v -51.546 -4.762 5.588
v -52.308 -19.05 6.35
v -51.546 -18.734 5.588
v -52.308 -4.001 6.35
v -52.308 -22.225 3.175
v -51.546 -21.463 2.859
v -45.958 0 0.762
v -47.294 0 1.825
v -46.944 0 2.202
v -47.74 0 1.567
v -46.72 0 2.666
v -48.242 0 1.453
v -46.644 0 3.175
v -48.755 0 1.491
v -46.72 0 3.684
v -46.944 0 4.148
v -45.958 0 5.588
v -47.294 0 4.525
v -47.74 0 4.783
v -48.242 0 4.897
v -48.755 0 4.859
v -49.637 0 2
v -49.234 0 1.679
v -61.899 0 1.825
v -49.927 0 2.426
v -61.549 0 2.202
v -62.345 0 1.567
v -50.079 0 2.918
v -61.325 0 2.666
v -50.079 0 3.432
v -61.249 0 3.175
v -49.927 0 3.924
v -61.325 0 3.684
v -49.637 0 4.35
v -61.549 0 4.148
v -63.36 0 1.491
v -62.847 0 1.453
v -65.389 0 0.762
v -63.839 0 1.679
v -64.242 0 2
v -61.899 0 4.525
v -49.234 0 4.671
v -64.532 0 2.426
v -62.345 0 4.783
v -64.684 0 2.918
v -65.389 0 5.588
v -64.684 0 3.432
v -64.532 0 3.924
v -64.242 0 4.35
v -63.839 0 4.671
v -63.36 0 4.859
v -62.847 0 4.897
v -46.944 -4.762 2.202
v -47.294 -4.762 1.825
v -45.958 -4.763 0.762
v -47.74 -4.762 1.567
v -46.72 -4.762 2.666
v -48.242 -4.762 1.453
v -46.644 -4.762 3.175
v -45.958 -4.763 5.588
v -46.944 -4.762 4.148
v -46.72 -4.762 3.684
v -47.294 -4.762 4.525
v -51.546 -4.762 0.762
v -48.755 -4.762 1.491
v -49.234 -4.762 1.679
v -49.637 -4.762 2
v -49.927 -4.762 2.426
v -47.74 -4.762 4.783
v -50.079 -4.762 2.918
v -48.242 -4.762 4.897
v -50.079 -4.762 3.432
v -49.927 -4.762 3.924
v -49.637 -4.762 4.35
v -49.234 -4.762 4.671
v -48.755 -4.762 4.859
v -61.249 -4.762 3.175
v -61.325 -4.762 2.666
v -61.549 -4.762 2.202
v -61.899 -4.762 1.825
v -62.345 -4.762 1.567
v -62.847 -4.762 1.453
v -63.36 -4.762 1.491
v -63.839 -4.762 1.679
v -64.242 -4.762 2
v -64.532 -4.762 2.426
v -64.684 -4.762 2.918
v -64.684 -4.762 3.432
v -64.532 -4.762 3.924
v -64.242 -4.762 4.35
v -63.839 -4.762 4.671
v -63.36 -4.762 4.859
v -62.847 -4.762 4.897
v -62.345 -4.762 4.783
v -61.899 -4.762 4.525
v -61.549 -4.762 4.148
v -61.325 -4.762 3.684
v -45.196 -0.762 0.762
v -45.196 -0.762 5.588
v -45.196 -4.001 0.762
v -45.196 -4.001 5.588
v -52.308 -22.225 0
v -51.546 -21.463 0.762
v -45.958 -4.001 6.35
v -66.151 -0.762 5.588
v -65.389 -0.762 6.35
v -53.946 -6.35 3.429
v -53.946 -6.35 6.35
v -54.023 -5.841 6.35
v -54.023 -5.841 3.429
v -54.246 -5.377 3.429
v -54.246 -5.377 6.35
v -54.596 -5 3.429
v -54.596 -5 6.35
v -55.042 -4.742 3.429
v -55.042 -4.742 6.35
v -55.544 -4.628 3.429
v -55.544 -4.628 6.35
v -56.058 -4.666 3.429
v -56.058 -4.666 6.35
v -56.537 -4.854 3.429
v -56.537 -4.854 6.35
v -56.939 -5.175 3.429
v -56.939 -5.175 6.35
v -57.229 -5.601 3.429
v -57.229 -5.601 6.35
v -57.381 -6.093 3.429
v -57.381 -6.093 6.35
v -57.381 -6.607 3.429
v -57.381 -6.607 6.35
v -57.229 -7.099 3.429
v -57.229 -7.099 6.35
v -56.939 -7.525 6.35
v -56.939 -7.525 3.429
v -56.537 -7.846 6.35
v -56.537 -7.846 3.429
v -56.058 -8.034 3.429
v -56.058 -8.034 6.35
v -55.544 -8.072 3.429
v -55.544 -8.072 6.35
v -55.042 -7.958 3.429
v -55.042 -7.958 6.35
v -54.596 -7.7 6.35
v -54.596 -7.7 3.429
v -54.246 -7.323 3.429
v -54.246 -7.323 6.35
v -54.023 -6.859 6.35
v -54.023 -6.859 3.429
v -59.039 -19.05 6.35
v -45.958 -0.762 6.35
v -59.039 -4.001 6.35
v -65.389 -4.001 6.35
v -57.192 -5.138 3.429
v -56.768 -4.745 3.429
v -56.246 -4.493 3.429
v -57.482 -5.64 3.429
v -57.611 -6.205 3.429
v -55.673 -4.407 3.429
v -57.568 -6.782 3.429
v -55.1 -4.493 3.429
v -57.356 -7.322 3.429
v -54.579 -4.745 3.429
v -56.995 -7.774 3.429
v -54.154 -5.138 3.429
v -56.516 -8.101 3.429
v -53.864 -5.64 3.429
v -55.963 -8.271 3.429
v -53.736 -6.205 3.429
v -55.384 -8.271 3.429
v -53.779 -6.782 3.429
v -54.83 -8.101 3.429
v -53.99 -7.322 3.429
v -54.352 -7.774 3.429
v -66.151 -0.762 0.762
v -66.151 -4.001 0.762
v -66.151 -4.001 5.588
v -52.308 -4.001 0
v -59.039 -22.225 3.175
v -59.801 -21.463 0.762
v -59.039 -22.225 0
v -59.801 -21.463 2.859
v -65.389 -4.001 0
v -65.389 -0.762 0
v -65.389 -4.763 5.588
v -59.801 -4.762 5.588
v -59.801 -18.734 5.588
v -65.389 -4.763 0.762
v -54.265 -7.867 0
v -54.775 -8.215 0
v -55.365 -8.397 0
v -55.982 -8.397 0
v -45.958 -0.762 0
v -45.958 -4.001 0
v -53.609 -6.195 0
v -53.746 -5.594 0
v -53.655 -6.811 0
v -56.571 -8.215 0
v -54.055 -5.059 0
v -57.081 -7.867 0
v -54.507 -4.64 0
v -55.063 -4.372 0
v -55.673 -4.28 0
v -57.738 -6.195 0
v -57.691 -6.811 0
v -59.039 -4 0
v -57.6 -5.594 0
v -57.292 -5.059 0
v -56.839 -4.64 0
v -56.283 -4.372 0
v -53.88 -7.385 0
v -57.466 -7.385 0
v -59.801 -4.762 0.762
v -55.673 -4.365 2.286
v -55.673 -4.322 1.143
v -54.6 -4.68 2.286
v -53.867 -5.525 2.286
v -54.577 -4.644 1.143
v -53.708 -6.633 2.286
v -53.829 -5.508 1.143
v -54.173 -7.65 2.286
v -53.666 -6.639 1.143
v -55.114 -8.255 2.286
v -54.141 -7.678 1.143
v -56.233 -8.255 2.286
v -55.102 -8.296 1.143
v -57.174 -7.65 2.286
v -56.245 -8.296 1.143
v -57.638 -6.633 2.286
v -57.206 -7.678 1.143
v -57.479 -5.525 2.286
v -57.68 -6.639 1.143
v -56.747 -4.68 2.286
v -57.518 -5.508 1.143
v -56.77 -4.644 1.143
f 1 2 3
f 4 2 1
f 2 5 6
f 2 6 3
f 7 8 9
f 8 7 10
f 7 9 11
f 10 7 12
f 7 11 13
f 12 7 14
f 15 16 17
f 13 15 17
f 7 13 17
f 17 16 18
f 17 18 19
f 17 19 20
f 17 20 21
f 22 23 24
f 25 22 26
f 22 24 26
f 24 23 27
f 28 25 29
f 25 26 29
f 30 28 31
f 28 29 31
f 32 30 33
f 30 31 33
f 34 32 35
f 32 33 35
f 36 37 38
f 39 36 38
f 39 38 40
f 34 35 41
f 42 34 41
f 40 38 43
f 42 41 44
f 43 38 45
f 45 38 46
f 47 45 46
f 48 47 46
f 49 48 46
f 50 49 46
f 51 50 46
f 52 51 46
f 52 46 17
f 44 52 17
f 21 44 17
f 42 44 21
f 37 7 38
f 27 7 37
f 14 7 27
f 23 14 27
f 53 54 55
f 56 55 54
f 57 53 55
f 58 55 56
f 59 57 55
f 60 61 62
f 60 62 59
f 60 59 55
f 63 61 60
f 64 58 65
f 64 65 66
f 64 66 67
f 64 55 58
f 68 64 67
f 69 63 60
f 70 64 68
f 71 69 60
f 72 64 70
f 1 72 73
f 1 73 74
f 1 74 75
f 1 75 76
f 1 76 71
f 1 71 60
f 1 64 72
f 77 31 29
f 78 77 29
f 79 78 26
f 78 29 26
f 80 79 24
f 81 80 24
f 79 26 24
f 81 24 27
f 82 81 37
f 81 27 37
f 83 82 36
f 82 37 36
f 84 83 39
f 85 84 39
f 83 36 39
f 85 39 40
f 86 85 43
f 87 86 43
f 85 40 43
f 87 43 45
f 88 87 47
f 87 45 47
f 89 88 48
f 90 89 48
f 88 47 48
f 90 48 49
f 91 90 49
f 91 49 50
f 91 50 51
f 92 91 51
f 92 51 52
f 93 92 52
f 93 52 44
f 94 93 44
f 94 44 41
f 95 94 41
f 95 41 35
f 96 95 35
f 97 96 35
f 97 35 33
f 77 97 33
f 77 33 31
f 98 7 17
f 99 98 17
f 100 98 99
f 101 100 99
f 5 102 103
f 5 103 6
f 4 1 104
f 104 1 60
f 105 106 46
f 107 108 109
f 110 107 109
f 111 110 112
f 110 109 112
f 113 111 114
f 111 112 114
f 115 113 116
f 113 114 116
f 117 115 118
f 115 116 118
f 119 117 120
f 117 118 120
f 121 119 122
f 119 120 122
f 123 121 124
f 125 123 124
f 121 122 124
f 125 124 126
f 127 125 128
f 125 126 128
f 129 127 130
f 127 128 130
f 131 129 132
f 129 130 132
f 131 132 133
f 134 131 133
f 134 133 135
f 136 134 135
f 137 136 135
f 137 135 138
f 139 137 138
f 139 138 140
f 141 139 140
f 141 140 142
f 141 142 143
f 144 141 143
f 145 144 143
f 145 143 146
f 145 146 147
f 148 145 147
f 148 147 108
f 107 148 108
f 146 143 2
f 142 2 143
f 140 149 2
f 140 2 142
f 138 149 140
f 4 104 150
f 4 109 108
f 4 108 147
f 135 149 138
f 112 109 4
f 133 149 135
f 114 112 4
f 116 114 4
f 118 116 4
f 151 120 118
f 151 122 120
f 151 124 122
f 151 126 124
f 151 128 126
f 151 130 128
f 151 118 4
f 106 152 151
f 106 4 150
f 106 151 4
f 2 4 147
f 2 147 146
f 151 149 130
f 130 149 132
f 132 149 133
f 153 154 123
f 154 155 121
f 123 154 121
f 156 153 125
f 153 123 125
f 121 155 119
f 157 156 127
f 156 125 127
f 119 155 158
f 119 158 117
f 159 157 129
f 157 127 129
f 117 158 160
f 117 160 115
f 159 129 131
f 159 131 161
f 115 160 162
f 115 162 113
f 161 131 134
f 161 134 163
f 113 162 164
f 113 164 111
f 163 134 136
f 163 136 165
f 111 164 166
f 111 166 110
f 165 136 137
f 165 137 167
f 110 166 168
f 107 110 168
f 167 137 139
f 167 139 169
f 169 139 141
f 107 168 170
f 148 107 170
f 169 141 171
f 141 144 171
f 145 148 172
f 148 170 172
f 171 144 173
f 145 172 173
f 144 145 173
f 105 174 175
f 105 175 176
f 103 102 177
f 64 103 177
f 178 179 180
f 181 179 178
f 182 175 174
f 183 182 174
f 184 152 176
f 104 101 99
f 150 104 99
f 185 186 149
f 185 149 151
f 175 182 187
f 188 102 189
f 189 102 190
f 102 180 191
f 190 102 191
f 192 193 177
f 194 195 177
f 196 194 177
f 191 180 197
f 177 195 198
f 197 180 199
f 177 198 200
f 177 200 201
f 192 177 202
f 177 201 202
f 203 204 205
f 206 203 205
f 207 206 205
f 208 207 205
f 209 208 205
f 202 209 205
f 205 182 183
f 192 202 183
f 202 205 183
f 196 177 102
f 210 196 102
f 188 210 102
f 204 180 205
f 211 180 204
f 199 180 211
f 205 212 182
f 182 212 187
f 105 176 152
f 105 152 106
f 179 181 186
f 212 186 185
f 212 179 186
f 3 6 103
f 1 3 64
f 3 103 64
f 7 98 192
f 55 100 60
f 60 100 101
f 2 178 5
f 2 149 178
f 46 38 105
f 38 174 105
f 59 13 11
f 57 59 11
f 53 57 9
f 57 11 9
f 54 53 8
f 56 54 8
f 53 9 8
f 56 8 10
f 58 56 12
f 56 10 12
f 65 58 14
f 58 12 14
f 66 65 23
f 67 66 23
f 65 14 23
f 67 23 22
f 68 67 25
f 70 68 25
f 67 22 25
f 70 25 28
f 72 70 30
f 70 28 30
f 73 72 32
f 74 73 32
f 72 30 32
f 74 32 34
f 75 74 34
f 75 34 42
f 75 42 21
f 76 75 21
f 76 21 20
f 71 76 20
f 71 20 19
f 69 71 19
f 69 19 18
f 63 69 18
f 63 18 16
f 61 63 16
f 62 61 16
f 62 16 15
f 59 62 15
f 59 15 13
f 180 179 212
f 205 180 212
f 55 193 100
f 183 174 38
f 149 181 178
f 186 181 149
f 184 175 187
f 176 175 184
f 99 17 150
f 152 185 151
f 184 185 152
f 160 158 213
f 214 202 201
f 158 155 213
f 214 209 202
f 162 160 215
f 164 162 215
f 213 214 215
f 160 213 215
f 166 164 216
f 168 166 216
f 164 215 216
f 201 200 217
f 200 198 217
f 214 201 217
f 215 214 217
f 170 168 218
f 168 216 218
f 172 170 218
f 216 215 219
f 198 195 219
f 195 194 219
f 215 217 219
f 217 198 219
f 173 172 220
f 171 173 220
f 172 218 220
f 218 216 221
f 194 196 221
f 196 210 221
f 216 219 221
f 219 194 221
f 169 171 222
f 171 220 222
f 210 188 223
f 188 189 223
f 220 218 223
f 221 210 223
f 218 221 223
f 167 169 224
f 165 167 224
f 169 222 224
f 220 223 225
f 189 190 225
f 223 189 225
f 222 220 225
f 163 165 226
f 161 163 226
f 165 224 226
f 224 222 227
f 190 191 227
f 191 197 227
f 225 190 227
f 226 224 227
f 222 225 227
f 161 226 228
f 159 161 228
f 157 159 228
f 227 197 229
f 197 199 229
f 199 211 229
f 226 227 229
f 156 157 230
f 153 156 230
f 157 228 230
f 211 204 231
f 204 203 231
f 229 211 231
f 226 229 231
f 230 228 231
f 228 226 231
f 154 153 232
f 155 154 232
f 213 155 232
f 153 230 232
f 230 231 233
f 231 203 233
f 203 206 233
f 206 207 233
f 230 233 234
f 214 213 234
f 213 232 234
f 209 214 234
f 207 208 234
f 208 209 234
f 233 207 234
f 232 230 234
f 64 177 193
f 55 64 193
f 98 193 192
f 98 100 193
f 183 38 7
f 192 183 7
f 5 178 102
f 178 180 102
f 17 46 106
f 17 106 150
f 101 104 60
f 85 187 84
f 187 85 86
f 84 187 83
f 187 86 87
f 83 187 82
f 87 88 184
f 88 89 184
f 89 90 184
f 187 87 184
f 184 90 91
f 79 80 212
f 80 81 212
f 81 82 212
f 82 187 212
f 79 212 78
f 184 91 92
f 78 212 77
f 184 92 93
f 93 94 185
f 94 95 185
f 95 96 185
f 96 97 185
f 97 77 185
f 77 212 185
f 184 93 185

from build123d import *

# Parameters (mm, degrees)
SKETCH1_W             = 8.255
SKETCH1_H             = 22.225
BOSS_EXTRUDE1_DEPTH   = 6.35
SKETCH2_W             = 6.35
SKETCH2_H             = 4.7625
BOSS_EXTRUDE2_DEPTH   = 6.35
BOSS_EXTRUDE3_START   = -8.255
SKETCH2_4_W           = 6.35
SKETCH2_4_H           = 4.7625
BOSS_EXTRUDE3_DEPTH   = 6.35
F_4_CLEARANCE_HOLE1_D = 3.4544
F_4_CLEARANCE_HOLE2_D = 3.4544
CHAMFER1_SIZE         = 3.175
CHAMFER2_SIZE         = 0.762


with BuildPart() as part:
    # Sketch1 → Boss-Extrude1 (new body)
    with BuildSketch(Plane.XY):
        with Locations((-55.673222486, -11.1125)):
            Rectangle(SKETCH1_W, SKETCH1_H)
    extrude(amount=BOSS_EXTRUDE1_DEPTH)

    # Sketch2 → Boss-Extrude2 (add)
    with BuildSketch(Plane.ZY.offset(59.800722486)):
        with Locations((3.175, -2.38125)):
            Rectangle(SKETCH2_W, SKETCH2_H)
    extrude(amount=BOSS_EXTRUDE2_DEPTH)

    # Sketch2<4> → Boss-Extrude3 (add)
    with BuildSketch(Plane.ZY.offset(59.800722486).offset(BOSS_EXTRUDE3_START)):
        with Locations((3.175, -2.38125)):
            Rectangle(SKETCH2_4_W, SKETCH2_4_H)
    extrude(amount=-BOSS_EXTRUDE3_DEPTH)

    # #4 Clearance Hole1 (through all)
    with Locations(Plane(origin=(0, 0, 0), x_dir=(-1, 0, 0), z_dir=(0, 0, -1))):
        with Locations((55.673222486, -6.35)):
            Hole(F_4_CLEARANCE_HOLE1_D / 2)

    # Sketch6 → Hole1 (revolve, cut)
    with BuildSketch(Plane(origin=(-55.673222486, -6.35, 0), x_dir=(0, 1, 0), z_dir=(1, 0, 0))):
        Polygon((0, 0), (0, 3.429), (1.9431, 3.429), (2.0701, 0), align=None)
    revolve(axis=Axis((-55.673222486, -6.35, 110), (0, 0, -1)), mode=Mode.SUBTRACT)

    # #4 Clearance Hole2 (through all)
    with Locations(Plane(origin=(0, -4.7625, 0), x_dir=(-1, 0, 0), z_dir=(0, -1, 0))):
        with Locations((48.370722486, -3.175), (62.975722486, -3.175)):
            Hole(F_4_CLEARANCE_HOLE2_D / 2)

    # Chamfer1
    chamfer1_edges = [part.edges().sort_by_distance(p)[0] for p in [
        (-55.673222486, -22.225, 6.35),
    ]]
    chamfer(chamfer1_edges, length=CHAMFER1_SIZE)

    # Chamfer2
    chamfer2_edges = [part.edges().sort_by_distance(p)[0] for p in [
        (-59.800722486, -13.49375, 0),
        (-59.800722486, -11.90625, 6.35),
        (-62.975722486, -4.7625, 6.35),
        (-62.975722486, -4.7625, 0),
        (-66.150722486, -2.38125, 6.35),
        (-55.673222486, 0, 6.35),
        (-66.150722486, 0, 3.175),
        (-66.150722486, -2.38125, 0),
        (-66.150722486, -4.7625, 3.175),
        (-45.195722486, -2.38125, 0),
        (-48.370722486, -4.7625, 0),
        (-45.195722486, 0, 3.175),
        (-48.370722486, -4.7625, 6.35),
        (-45.195722486, -2.38125, 6.35),
        (-45.195722486, -4.7625, 3.175),
        (-55.673222486, 0, 0),
        (-51.545722486, -13.49375, 0),
        (-51.545722486, -11.90625, 6.35),
        (-51.545722486, -22.225, 1.5875),
        (-51.545722486, -20.6375, 4.7625),
        (-59.800722486, -22.225, 1.5875),
        (-59.800722486, -20.6375, 4.7625),
    ]]
    chamfer(chamfer2_edges, length=CHAMFER2_SIZE)


solid = part.part
